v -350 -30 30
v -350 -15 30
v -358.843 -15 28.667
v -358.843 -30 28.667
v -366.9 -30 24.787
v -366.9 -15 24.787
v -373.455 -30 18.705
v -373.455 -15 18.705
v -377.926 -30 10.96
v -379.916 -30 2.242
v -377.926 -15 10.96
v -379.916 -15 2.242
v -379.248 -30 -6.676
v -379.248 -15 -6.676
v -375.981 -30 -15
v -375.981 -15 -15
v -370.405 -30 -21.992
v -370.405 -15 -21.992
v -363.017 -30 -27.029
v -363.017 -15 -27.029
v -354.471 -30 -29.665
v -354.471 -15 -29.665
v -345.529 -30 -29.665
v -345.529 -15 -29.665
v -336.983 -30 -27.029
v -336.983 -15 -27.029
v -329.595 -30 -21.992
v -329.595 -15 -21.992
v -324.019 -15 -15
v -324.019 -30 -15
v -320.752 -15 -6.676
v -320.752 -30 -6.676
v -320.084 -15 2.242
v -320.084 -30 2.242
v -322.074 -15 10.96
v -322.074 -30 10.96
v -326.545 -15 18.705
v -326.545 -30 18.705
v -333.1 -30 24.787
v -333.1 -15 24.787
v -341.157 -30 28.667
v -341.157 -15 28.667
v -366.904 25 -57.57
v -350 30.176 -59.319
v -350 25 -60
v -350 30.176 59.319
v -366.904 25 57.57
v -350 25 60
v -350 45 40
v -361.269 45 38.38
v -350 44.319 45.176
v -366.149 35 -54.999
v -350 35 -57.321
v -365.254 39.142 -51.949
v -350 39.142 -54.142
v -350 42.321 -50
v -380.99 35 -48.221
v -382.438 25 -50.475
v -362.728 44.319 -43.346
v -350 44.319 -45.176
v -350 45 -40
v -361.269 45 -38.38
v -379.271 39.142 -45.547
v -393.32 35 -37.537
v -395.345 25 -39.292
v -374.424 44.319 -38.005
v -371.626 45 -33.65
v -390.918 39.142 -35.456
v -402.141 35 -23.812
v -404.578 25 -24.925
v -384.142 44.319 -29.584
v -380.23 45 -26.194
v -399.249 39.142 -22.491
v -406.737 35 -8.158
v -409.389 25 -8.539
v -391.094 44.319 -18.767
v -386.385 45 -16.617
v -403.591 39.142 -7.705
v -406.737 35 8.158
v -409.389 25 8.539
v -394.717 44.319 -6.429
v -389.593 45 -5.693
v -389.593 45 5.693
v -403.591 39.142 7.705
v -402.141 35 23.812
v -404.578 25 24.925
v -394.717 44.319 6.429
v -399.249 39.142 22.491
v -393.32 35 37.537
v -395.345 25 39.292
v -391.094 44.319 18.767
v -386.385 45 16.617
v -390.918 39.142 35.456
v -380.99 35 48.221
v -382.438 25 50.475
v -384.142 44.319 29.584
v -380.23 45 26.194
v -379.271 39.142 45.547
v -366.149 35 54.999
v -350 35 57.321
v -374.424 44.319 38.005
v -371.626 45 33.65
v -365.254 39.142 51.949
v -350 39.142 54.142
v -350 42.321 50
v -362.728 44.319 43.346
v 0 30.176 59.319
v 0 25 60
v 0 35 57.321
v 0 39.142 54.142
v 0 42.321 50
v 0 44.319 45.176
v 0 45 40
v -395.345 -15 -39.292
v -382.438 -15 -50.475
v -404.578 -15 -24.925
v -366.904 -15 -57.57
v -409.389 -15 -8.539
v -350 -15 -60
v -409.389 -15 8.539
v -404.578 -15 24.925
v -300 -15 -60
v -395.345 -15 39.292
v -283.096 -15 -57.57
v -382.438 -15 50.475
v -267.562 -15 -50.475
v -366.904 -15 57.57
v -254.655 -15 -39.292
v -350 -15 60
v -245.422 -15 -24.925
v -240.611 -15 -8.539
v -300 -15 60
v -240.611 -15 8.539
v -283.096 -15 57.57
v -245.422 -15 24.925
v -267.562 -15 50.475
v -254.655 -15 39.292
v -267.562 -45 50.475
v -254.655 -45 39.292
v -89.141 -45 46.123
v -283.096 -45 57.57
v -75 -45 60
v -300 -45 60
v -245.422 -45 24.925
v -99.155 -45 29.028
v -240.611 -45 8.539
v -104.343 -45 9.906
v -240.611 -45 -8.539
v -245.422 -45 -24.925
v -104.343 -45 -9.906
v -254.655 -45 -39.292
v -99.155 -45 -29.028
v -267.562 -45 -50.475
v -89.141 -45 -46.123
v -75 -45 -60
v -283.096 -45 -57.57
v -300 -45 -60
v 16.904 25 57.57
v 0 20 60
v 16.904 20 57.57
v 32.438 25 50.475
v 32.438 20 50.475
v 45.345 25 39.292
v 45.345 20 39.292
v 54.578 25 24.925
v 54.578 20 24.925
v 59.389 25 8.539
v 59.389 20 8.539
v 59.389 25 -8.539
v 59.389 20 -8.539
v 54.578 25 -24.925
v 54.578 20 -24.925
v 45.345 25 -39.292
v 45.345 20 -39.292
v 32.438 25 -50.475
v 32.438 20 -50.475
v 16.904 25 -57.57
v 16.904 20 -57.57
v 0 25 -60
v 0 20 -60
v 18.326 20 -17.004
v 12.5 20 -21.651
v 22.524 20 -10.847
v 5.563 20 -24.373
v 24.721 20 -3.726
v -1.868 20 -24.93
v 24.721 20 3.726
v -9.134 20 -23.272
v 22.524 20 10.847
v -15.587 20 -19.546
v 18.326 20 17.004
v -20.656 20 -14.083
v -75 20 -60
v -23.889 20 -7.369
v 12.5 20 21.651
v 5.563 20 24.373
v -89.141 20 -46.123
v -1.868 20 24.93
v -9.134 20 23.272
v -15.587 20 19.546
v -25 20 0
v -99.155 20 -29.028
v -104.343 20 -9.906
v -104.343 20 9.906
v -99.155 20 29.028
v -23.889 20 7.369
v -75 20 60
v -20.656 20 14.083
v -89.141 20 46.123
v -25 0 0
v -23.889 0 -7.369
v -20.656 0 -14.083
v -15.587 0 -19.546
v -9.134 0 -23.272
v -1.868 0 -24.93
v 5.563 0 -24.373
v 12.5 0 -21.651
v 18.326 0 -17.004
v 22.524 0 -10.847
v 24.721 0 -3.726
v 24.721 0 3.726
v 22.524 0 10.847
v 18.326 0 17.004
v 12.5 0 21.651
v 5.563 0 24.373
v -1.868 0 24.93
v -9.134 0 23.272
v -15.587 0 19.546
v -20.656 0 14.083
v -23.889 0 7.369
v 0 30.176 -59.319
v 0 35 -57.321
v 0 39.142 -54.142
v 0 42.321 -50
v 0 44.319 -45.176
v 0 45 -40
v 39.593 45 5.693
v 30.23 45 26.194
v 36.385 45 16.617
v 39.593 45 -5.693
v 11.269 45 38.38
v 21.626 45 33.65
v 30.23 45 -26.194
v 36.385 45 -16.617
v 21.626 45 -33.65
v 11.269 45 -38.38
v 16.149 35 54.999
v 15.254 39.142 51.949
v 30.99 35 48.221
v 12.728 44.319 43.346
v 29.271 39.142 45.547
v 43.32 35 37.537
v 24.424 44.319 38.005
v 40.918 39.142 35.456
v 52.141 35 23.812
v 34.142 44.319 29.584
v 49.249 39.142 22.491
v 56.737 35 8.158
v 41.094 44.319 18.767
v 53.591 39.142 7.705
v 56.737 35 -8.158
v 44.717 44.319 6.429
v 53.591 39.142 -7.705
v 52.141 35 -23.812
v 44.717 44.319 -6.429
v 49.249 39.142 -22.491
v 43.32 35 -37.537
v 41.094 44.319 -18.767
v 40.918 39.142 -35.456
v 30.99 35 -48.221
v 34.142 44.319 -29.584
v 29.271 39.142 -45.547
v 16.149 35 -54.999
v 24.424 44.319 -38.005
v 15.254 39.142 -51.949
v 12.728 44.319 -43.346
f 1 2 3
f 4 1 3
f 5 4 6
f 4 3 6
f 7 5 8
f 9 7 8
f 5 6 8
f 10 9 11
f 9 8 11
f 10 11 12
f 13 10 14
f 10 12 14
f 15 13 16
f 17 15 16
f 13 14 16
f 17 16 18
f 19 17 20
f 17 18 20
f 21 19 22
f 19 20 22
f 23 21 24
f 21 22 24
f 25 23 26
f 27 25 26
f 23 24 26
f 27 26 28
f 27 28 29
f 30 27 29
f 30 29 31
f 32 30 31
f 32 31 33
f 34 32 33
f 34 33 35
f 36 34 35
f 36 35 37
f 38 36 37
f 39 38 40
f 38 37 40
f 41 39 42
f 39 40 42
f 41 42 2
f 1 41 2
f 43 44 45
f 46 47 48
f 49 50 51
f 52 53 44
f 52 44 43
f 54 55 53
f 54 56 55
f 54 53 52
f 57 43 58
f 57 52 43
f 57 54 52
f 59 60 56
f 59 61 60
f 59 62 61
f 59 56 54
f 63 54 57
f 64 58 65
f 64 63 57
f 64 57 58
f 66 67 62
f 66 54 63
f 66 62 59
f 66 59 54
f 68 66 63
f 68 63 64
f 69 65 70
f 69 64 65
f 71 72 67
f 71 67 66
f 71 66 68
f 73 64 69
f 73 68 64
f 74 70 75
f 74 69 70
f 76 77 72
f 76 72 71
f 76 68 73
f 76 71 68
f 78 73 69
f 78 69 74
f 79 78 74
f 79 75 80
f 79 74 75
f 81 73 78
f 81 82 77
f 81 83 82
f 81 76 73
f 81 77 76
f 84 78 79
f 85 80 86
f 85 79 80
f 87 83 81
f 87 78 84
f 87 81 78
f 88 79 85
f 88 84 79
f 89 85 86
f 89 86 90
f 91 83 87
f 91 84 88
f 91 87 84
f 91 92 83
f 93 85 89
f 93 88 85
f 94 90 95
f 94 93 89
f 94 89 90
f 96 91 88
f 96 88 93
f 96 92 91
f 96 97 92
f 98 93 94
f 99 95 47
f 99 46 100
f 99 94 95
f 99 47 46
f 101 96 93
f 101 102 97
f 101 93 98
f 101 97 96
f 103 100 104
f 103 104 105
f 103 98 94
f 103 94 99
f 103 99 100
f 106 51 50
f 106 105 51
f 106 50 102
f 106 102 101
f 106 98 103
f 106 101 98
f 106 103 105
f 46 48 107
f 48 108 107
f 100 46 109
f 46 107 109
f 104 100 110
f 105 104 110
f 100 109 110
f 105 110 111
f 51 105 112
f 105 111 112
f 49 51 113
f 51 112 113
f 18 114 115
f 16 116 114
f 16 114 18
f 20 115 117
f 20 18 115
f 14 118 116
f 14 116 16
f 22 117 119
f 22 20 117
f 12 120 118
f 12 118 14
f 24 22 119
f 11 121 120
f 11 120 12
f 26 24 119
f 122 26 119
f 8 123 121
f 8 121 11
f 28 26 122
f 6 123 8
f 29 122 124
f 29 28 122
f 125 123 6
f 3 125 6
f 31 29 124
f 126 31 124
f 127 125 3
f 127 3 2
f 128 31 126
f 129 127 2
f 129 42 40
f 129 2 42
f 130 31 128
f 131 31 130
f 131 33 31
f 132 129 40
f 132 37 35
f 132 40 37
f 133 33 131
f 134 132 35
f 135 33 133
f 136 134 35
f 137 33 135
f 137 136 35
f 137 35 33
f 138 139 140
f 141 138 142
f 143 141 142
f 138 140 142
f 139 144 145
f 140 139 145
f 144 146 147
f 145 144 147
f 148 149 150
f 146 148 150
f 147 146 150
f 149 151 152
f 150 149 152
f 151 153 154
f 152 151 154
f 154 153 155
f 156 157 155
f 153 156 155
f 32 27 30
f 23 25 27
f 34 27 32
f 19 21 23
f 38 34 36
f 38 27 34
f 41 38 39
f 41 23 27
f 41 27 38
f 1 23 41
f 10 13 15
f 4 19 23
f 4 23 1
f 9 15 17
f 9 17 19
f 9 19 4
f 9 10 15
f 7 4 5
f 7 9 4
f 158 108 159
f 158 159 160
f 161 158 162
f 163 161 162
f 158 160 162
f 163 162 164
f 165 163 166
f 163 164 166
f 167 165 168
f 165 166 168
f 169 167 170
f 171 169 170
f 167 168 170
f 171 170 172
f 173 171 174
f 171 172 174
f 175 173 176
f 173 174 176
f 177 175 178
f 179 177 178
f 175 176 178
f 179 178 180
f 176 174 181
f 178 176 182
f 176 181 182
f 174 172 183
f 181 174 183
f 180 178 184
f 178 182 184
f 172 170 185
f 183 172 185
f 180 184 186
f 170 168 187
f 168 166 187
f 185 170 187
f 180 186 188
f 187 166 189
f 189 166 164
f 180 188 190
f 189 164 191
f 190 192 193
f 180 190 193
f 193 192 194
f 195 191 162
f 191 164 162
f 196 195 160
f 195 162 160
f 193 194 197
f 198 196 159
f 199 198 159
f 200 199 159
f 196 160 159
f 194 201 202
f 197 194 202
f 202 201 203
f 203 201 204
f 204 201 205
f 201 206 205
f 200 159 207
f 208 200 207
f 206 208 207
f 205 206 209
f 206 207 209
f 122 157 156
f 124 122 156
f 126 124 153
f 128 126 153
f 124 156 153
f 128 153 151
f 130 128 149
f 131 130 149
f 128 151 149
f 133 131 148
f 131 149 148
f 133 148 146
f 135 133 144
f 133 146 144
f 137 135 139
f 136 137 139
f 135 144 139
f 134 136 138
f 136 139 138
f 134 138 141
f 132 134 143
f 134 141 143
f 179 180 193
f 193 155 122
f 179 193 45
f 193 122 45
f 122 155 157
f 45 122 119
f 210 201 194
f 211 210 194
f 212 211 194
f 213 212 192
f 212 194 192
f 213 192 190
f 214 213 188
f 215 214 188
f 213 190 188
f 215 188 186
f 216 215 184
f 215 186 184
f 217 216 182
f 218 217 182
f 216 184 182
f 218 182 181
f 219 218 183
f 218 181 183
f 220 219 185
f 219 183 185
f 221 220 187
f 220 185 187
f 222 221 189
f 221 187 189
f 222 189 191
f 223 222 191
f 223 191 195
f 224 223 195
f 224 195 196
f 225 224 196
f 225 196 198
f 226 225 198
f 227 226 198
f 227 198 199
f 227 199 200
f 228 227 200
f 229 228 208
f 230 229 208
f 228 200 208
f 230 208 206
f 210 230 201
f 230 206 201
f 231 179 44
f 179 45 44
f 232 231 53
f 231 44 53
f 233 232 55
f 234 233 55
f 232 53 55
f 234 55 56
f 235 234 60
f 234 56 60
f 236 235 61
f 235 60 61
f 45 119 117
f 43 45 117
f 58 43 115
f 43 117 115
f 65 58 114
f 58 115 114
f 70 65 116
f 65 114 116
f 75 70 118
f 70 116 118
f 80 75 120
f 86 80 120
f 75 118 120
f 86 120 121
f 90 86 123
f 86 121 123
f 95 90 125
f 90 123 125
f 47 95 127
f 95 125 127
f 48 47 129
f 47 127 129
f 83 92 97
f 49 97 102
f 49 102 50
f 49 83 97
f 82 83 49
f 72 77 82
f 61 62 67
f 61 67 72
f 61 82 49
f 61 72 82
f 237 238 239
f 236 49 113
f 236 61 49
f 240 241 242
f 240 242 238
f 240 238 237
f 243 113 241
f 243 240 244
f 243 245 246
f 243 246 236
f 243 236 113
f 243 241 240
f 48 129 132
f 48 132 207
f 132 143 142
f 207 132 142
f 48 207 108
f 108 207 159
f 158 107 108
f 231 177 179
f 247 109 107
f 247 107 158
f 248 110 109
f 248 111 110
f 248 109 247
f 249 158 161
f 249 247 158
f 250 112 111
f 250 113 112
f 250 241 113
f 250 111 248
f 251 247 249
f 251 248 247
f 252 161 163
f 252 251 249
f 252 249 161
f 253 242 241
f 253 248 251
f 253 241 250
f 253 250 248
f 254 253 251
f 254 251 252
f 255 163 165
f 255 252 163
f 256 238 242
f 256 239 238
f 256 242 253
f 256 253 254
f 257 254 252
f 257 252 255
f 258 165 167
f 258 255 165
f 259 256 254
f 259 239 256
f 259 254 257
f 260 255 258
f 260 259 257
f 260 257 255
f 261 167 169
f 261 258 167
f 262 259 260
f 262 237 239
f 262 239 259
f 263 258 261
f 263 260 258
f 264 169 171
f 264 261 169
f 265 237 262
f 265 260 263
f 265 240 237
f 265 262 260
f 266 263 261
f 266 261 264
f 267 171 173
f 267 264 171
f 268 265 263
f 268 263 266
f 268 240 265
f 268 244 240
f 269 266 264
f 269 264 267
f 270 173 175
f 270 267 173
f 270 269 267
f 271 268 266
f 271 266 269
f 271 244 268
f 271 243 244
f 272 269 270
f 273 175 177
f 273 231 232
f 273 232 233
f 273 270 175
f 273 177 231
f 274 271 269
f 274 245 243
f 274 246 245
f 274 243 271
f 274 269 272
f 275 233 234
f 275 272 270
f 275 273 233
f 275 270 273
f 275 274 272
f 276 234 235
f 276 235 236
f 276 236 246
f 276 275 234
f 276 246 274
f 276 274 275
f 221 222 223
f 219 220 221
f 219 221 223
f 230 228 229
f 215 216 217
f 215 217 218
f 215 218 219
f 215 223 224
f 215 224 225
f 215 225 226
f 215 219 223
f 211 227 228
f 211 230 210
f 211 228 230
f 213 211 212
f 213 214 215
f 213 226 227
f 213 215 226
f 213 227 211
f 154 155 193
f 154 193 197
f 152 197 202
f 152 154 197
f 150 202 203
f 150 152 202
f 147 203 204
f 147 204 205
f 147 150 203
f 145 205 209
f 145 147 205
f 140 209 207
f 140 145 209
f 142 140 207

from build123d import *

# Parameters (mm, degrees)
AUFSATZ_LINEAR_AUSTRAGEN1_DEPTH      = 45
AUFSATZ_LINEAR_AUSTRAGEN1_DEPTH_BACK = 45
SKIZZE3_W                            = 90
SKIZZE3_H                            = 65
SCHNITT_LINEAR_AUSTRAGEN1_DEPTH      = 120
SKIZZE4_R                            = 25
AUFSATZ_LINEAR_AUSTRAGEN2_DEPTH      = 20
SCHNITT_LINEAR_AUSTRAGEN2_DEPTH      = 65
SKIZZE6_W                            = 110
SKIZZE6_H                            = 30
SCHNITT_LINEAR_AUSTRAGEN3_DEPTH      = 120
SCHNITT_LINEAR_AUSTRAGEN4_DEPTH      = 30
SKIZZE8_R                            = 30
AUFSATZ_LINEAR_AUSTRAGEN3_DEPTH      = 15
VERRUNDUNG1_R                        = 20


with BuildPart() as part:
    # Skizze2 → Aufsatz-Linear austragen1 (new, two sides: drawn at the far end of the back side and taken through both)
    with BuildSketch(Plane(origin=(0, 0, 0), x_dir=(1, 0, 0), z_dir=(0, 1, 0)).offset(-AUFSATZ_LINEAR_AUSTRAGEN1_DEPTH_BACK)):
        with BuildLine():
            Line((-350, -60), (0, -60))
            ThreePointArc((0, -60), (60, 0), (0, 60))
            Line((0, 60), (-350, 60))
            ThreePointArc((-350, 60), (-410, 0), (-350, -60))
        make_face()
    extrude(amount=AUFSATZ_LINEAR_AUSTRAGEN1_DEPTH + AUFSATZ_LINEAR_AUSTRAGEN1_DEPTH_BACK)

    # Skizze3 → Schnitt-Linear austragen1 (cut)
    with BuildSketch(Plane.XY.offset(60)):
        with Locations((15, -12.5)):
            Rectangle(SKIZZE3_W, SKIZZE3_H)
    extrude(amount=-SCHNITT_LINEAR_AUSTRAGEN1_DEPTH, mode=Mode.SUBTRACT)

    # Skizze4 → Aufsatz-Linear austragen2 (add)
    with BuildSketch(Plane.XZ.offset(-20)):
        with Locations(Location((0, 0, 0), (0, 0, 180))):
            Circle(SKIZZE4_R)
    extrude(amount=AUFSATZ_LINEAR_AUSTRAGEN2_DEPTH)

    # Skizze5 → Schnitt-Linear austragen2 (cut)
    with BuildSketch(Plane.XZ.offset(45)):
        with BuildLine():
            Line((-30, 75), (-30, -75))
            ThreePointArc((-30, -75), (-105, 0), (-30, 75))
        make_face()
    extrude(amount=-SCHNITT_LINEAR_AUSTRAGEN2_DEPTH, mode=Mode.SUBTRACT)

    # Skizze6 → Schnitt-Linear austragen3 (cut)
    with BuildSketch(Plane.XY.offset(60)):
        with Locations((-355, -30)):
            Rectangle(SKIZZE6_W, SKIZZE6_H)
    extrude(amount=-SCHNITT_LINEAR_AUSTRAGEN3_DEPTH, mode=Mode.SUBTRACT)

    # Skizze7 → Schnitt-Linear austragen4 (cut)
    with BuildSketch(Plane(origin=(0, -45, 0), x_dir=(-1, 0, 0), z_dir=(0, -1, 0))):
        with BuildLine():
            Line((300, -60), (300, 60))
            ThreePointArc((300, 60), (240, 0), (300, -60))
        make_face()
    extrude(amount=-SCHNITT_LINEAR_AUSTRAGEN4_DEPTH, mode=Mode.SUBTRACT)

    # Skizze8 → Aufsatz-Linear austragen3 (add)
    with BuildSketch(Plane(origin=(0, -15, 0), x_dir=(-1, 0, 0), z_dir=(0, -1, 0))):
        with Locations(Location((350, 0, 0), (0, 0, 270))):
            Circle(SKIZZE8_R)
    extrude(amount=AUFSATZ_LINEAR_AUSTRAGEN3_DEPTH)

    # Verrundung1
    verrundung1_edges = [part.edges().sort_by_distance(p)[0] for p in [
        (-175, 45, 60),
        (-175, 45, -60),
        (-410, 45, 0),
        (60, 45, 0),
    ]]
    fillet(verrundung1_edges, radius=VERRUNDUNG1_R)


solid = part.part
